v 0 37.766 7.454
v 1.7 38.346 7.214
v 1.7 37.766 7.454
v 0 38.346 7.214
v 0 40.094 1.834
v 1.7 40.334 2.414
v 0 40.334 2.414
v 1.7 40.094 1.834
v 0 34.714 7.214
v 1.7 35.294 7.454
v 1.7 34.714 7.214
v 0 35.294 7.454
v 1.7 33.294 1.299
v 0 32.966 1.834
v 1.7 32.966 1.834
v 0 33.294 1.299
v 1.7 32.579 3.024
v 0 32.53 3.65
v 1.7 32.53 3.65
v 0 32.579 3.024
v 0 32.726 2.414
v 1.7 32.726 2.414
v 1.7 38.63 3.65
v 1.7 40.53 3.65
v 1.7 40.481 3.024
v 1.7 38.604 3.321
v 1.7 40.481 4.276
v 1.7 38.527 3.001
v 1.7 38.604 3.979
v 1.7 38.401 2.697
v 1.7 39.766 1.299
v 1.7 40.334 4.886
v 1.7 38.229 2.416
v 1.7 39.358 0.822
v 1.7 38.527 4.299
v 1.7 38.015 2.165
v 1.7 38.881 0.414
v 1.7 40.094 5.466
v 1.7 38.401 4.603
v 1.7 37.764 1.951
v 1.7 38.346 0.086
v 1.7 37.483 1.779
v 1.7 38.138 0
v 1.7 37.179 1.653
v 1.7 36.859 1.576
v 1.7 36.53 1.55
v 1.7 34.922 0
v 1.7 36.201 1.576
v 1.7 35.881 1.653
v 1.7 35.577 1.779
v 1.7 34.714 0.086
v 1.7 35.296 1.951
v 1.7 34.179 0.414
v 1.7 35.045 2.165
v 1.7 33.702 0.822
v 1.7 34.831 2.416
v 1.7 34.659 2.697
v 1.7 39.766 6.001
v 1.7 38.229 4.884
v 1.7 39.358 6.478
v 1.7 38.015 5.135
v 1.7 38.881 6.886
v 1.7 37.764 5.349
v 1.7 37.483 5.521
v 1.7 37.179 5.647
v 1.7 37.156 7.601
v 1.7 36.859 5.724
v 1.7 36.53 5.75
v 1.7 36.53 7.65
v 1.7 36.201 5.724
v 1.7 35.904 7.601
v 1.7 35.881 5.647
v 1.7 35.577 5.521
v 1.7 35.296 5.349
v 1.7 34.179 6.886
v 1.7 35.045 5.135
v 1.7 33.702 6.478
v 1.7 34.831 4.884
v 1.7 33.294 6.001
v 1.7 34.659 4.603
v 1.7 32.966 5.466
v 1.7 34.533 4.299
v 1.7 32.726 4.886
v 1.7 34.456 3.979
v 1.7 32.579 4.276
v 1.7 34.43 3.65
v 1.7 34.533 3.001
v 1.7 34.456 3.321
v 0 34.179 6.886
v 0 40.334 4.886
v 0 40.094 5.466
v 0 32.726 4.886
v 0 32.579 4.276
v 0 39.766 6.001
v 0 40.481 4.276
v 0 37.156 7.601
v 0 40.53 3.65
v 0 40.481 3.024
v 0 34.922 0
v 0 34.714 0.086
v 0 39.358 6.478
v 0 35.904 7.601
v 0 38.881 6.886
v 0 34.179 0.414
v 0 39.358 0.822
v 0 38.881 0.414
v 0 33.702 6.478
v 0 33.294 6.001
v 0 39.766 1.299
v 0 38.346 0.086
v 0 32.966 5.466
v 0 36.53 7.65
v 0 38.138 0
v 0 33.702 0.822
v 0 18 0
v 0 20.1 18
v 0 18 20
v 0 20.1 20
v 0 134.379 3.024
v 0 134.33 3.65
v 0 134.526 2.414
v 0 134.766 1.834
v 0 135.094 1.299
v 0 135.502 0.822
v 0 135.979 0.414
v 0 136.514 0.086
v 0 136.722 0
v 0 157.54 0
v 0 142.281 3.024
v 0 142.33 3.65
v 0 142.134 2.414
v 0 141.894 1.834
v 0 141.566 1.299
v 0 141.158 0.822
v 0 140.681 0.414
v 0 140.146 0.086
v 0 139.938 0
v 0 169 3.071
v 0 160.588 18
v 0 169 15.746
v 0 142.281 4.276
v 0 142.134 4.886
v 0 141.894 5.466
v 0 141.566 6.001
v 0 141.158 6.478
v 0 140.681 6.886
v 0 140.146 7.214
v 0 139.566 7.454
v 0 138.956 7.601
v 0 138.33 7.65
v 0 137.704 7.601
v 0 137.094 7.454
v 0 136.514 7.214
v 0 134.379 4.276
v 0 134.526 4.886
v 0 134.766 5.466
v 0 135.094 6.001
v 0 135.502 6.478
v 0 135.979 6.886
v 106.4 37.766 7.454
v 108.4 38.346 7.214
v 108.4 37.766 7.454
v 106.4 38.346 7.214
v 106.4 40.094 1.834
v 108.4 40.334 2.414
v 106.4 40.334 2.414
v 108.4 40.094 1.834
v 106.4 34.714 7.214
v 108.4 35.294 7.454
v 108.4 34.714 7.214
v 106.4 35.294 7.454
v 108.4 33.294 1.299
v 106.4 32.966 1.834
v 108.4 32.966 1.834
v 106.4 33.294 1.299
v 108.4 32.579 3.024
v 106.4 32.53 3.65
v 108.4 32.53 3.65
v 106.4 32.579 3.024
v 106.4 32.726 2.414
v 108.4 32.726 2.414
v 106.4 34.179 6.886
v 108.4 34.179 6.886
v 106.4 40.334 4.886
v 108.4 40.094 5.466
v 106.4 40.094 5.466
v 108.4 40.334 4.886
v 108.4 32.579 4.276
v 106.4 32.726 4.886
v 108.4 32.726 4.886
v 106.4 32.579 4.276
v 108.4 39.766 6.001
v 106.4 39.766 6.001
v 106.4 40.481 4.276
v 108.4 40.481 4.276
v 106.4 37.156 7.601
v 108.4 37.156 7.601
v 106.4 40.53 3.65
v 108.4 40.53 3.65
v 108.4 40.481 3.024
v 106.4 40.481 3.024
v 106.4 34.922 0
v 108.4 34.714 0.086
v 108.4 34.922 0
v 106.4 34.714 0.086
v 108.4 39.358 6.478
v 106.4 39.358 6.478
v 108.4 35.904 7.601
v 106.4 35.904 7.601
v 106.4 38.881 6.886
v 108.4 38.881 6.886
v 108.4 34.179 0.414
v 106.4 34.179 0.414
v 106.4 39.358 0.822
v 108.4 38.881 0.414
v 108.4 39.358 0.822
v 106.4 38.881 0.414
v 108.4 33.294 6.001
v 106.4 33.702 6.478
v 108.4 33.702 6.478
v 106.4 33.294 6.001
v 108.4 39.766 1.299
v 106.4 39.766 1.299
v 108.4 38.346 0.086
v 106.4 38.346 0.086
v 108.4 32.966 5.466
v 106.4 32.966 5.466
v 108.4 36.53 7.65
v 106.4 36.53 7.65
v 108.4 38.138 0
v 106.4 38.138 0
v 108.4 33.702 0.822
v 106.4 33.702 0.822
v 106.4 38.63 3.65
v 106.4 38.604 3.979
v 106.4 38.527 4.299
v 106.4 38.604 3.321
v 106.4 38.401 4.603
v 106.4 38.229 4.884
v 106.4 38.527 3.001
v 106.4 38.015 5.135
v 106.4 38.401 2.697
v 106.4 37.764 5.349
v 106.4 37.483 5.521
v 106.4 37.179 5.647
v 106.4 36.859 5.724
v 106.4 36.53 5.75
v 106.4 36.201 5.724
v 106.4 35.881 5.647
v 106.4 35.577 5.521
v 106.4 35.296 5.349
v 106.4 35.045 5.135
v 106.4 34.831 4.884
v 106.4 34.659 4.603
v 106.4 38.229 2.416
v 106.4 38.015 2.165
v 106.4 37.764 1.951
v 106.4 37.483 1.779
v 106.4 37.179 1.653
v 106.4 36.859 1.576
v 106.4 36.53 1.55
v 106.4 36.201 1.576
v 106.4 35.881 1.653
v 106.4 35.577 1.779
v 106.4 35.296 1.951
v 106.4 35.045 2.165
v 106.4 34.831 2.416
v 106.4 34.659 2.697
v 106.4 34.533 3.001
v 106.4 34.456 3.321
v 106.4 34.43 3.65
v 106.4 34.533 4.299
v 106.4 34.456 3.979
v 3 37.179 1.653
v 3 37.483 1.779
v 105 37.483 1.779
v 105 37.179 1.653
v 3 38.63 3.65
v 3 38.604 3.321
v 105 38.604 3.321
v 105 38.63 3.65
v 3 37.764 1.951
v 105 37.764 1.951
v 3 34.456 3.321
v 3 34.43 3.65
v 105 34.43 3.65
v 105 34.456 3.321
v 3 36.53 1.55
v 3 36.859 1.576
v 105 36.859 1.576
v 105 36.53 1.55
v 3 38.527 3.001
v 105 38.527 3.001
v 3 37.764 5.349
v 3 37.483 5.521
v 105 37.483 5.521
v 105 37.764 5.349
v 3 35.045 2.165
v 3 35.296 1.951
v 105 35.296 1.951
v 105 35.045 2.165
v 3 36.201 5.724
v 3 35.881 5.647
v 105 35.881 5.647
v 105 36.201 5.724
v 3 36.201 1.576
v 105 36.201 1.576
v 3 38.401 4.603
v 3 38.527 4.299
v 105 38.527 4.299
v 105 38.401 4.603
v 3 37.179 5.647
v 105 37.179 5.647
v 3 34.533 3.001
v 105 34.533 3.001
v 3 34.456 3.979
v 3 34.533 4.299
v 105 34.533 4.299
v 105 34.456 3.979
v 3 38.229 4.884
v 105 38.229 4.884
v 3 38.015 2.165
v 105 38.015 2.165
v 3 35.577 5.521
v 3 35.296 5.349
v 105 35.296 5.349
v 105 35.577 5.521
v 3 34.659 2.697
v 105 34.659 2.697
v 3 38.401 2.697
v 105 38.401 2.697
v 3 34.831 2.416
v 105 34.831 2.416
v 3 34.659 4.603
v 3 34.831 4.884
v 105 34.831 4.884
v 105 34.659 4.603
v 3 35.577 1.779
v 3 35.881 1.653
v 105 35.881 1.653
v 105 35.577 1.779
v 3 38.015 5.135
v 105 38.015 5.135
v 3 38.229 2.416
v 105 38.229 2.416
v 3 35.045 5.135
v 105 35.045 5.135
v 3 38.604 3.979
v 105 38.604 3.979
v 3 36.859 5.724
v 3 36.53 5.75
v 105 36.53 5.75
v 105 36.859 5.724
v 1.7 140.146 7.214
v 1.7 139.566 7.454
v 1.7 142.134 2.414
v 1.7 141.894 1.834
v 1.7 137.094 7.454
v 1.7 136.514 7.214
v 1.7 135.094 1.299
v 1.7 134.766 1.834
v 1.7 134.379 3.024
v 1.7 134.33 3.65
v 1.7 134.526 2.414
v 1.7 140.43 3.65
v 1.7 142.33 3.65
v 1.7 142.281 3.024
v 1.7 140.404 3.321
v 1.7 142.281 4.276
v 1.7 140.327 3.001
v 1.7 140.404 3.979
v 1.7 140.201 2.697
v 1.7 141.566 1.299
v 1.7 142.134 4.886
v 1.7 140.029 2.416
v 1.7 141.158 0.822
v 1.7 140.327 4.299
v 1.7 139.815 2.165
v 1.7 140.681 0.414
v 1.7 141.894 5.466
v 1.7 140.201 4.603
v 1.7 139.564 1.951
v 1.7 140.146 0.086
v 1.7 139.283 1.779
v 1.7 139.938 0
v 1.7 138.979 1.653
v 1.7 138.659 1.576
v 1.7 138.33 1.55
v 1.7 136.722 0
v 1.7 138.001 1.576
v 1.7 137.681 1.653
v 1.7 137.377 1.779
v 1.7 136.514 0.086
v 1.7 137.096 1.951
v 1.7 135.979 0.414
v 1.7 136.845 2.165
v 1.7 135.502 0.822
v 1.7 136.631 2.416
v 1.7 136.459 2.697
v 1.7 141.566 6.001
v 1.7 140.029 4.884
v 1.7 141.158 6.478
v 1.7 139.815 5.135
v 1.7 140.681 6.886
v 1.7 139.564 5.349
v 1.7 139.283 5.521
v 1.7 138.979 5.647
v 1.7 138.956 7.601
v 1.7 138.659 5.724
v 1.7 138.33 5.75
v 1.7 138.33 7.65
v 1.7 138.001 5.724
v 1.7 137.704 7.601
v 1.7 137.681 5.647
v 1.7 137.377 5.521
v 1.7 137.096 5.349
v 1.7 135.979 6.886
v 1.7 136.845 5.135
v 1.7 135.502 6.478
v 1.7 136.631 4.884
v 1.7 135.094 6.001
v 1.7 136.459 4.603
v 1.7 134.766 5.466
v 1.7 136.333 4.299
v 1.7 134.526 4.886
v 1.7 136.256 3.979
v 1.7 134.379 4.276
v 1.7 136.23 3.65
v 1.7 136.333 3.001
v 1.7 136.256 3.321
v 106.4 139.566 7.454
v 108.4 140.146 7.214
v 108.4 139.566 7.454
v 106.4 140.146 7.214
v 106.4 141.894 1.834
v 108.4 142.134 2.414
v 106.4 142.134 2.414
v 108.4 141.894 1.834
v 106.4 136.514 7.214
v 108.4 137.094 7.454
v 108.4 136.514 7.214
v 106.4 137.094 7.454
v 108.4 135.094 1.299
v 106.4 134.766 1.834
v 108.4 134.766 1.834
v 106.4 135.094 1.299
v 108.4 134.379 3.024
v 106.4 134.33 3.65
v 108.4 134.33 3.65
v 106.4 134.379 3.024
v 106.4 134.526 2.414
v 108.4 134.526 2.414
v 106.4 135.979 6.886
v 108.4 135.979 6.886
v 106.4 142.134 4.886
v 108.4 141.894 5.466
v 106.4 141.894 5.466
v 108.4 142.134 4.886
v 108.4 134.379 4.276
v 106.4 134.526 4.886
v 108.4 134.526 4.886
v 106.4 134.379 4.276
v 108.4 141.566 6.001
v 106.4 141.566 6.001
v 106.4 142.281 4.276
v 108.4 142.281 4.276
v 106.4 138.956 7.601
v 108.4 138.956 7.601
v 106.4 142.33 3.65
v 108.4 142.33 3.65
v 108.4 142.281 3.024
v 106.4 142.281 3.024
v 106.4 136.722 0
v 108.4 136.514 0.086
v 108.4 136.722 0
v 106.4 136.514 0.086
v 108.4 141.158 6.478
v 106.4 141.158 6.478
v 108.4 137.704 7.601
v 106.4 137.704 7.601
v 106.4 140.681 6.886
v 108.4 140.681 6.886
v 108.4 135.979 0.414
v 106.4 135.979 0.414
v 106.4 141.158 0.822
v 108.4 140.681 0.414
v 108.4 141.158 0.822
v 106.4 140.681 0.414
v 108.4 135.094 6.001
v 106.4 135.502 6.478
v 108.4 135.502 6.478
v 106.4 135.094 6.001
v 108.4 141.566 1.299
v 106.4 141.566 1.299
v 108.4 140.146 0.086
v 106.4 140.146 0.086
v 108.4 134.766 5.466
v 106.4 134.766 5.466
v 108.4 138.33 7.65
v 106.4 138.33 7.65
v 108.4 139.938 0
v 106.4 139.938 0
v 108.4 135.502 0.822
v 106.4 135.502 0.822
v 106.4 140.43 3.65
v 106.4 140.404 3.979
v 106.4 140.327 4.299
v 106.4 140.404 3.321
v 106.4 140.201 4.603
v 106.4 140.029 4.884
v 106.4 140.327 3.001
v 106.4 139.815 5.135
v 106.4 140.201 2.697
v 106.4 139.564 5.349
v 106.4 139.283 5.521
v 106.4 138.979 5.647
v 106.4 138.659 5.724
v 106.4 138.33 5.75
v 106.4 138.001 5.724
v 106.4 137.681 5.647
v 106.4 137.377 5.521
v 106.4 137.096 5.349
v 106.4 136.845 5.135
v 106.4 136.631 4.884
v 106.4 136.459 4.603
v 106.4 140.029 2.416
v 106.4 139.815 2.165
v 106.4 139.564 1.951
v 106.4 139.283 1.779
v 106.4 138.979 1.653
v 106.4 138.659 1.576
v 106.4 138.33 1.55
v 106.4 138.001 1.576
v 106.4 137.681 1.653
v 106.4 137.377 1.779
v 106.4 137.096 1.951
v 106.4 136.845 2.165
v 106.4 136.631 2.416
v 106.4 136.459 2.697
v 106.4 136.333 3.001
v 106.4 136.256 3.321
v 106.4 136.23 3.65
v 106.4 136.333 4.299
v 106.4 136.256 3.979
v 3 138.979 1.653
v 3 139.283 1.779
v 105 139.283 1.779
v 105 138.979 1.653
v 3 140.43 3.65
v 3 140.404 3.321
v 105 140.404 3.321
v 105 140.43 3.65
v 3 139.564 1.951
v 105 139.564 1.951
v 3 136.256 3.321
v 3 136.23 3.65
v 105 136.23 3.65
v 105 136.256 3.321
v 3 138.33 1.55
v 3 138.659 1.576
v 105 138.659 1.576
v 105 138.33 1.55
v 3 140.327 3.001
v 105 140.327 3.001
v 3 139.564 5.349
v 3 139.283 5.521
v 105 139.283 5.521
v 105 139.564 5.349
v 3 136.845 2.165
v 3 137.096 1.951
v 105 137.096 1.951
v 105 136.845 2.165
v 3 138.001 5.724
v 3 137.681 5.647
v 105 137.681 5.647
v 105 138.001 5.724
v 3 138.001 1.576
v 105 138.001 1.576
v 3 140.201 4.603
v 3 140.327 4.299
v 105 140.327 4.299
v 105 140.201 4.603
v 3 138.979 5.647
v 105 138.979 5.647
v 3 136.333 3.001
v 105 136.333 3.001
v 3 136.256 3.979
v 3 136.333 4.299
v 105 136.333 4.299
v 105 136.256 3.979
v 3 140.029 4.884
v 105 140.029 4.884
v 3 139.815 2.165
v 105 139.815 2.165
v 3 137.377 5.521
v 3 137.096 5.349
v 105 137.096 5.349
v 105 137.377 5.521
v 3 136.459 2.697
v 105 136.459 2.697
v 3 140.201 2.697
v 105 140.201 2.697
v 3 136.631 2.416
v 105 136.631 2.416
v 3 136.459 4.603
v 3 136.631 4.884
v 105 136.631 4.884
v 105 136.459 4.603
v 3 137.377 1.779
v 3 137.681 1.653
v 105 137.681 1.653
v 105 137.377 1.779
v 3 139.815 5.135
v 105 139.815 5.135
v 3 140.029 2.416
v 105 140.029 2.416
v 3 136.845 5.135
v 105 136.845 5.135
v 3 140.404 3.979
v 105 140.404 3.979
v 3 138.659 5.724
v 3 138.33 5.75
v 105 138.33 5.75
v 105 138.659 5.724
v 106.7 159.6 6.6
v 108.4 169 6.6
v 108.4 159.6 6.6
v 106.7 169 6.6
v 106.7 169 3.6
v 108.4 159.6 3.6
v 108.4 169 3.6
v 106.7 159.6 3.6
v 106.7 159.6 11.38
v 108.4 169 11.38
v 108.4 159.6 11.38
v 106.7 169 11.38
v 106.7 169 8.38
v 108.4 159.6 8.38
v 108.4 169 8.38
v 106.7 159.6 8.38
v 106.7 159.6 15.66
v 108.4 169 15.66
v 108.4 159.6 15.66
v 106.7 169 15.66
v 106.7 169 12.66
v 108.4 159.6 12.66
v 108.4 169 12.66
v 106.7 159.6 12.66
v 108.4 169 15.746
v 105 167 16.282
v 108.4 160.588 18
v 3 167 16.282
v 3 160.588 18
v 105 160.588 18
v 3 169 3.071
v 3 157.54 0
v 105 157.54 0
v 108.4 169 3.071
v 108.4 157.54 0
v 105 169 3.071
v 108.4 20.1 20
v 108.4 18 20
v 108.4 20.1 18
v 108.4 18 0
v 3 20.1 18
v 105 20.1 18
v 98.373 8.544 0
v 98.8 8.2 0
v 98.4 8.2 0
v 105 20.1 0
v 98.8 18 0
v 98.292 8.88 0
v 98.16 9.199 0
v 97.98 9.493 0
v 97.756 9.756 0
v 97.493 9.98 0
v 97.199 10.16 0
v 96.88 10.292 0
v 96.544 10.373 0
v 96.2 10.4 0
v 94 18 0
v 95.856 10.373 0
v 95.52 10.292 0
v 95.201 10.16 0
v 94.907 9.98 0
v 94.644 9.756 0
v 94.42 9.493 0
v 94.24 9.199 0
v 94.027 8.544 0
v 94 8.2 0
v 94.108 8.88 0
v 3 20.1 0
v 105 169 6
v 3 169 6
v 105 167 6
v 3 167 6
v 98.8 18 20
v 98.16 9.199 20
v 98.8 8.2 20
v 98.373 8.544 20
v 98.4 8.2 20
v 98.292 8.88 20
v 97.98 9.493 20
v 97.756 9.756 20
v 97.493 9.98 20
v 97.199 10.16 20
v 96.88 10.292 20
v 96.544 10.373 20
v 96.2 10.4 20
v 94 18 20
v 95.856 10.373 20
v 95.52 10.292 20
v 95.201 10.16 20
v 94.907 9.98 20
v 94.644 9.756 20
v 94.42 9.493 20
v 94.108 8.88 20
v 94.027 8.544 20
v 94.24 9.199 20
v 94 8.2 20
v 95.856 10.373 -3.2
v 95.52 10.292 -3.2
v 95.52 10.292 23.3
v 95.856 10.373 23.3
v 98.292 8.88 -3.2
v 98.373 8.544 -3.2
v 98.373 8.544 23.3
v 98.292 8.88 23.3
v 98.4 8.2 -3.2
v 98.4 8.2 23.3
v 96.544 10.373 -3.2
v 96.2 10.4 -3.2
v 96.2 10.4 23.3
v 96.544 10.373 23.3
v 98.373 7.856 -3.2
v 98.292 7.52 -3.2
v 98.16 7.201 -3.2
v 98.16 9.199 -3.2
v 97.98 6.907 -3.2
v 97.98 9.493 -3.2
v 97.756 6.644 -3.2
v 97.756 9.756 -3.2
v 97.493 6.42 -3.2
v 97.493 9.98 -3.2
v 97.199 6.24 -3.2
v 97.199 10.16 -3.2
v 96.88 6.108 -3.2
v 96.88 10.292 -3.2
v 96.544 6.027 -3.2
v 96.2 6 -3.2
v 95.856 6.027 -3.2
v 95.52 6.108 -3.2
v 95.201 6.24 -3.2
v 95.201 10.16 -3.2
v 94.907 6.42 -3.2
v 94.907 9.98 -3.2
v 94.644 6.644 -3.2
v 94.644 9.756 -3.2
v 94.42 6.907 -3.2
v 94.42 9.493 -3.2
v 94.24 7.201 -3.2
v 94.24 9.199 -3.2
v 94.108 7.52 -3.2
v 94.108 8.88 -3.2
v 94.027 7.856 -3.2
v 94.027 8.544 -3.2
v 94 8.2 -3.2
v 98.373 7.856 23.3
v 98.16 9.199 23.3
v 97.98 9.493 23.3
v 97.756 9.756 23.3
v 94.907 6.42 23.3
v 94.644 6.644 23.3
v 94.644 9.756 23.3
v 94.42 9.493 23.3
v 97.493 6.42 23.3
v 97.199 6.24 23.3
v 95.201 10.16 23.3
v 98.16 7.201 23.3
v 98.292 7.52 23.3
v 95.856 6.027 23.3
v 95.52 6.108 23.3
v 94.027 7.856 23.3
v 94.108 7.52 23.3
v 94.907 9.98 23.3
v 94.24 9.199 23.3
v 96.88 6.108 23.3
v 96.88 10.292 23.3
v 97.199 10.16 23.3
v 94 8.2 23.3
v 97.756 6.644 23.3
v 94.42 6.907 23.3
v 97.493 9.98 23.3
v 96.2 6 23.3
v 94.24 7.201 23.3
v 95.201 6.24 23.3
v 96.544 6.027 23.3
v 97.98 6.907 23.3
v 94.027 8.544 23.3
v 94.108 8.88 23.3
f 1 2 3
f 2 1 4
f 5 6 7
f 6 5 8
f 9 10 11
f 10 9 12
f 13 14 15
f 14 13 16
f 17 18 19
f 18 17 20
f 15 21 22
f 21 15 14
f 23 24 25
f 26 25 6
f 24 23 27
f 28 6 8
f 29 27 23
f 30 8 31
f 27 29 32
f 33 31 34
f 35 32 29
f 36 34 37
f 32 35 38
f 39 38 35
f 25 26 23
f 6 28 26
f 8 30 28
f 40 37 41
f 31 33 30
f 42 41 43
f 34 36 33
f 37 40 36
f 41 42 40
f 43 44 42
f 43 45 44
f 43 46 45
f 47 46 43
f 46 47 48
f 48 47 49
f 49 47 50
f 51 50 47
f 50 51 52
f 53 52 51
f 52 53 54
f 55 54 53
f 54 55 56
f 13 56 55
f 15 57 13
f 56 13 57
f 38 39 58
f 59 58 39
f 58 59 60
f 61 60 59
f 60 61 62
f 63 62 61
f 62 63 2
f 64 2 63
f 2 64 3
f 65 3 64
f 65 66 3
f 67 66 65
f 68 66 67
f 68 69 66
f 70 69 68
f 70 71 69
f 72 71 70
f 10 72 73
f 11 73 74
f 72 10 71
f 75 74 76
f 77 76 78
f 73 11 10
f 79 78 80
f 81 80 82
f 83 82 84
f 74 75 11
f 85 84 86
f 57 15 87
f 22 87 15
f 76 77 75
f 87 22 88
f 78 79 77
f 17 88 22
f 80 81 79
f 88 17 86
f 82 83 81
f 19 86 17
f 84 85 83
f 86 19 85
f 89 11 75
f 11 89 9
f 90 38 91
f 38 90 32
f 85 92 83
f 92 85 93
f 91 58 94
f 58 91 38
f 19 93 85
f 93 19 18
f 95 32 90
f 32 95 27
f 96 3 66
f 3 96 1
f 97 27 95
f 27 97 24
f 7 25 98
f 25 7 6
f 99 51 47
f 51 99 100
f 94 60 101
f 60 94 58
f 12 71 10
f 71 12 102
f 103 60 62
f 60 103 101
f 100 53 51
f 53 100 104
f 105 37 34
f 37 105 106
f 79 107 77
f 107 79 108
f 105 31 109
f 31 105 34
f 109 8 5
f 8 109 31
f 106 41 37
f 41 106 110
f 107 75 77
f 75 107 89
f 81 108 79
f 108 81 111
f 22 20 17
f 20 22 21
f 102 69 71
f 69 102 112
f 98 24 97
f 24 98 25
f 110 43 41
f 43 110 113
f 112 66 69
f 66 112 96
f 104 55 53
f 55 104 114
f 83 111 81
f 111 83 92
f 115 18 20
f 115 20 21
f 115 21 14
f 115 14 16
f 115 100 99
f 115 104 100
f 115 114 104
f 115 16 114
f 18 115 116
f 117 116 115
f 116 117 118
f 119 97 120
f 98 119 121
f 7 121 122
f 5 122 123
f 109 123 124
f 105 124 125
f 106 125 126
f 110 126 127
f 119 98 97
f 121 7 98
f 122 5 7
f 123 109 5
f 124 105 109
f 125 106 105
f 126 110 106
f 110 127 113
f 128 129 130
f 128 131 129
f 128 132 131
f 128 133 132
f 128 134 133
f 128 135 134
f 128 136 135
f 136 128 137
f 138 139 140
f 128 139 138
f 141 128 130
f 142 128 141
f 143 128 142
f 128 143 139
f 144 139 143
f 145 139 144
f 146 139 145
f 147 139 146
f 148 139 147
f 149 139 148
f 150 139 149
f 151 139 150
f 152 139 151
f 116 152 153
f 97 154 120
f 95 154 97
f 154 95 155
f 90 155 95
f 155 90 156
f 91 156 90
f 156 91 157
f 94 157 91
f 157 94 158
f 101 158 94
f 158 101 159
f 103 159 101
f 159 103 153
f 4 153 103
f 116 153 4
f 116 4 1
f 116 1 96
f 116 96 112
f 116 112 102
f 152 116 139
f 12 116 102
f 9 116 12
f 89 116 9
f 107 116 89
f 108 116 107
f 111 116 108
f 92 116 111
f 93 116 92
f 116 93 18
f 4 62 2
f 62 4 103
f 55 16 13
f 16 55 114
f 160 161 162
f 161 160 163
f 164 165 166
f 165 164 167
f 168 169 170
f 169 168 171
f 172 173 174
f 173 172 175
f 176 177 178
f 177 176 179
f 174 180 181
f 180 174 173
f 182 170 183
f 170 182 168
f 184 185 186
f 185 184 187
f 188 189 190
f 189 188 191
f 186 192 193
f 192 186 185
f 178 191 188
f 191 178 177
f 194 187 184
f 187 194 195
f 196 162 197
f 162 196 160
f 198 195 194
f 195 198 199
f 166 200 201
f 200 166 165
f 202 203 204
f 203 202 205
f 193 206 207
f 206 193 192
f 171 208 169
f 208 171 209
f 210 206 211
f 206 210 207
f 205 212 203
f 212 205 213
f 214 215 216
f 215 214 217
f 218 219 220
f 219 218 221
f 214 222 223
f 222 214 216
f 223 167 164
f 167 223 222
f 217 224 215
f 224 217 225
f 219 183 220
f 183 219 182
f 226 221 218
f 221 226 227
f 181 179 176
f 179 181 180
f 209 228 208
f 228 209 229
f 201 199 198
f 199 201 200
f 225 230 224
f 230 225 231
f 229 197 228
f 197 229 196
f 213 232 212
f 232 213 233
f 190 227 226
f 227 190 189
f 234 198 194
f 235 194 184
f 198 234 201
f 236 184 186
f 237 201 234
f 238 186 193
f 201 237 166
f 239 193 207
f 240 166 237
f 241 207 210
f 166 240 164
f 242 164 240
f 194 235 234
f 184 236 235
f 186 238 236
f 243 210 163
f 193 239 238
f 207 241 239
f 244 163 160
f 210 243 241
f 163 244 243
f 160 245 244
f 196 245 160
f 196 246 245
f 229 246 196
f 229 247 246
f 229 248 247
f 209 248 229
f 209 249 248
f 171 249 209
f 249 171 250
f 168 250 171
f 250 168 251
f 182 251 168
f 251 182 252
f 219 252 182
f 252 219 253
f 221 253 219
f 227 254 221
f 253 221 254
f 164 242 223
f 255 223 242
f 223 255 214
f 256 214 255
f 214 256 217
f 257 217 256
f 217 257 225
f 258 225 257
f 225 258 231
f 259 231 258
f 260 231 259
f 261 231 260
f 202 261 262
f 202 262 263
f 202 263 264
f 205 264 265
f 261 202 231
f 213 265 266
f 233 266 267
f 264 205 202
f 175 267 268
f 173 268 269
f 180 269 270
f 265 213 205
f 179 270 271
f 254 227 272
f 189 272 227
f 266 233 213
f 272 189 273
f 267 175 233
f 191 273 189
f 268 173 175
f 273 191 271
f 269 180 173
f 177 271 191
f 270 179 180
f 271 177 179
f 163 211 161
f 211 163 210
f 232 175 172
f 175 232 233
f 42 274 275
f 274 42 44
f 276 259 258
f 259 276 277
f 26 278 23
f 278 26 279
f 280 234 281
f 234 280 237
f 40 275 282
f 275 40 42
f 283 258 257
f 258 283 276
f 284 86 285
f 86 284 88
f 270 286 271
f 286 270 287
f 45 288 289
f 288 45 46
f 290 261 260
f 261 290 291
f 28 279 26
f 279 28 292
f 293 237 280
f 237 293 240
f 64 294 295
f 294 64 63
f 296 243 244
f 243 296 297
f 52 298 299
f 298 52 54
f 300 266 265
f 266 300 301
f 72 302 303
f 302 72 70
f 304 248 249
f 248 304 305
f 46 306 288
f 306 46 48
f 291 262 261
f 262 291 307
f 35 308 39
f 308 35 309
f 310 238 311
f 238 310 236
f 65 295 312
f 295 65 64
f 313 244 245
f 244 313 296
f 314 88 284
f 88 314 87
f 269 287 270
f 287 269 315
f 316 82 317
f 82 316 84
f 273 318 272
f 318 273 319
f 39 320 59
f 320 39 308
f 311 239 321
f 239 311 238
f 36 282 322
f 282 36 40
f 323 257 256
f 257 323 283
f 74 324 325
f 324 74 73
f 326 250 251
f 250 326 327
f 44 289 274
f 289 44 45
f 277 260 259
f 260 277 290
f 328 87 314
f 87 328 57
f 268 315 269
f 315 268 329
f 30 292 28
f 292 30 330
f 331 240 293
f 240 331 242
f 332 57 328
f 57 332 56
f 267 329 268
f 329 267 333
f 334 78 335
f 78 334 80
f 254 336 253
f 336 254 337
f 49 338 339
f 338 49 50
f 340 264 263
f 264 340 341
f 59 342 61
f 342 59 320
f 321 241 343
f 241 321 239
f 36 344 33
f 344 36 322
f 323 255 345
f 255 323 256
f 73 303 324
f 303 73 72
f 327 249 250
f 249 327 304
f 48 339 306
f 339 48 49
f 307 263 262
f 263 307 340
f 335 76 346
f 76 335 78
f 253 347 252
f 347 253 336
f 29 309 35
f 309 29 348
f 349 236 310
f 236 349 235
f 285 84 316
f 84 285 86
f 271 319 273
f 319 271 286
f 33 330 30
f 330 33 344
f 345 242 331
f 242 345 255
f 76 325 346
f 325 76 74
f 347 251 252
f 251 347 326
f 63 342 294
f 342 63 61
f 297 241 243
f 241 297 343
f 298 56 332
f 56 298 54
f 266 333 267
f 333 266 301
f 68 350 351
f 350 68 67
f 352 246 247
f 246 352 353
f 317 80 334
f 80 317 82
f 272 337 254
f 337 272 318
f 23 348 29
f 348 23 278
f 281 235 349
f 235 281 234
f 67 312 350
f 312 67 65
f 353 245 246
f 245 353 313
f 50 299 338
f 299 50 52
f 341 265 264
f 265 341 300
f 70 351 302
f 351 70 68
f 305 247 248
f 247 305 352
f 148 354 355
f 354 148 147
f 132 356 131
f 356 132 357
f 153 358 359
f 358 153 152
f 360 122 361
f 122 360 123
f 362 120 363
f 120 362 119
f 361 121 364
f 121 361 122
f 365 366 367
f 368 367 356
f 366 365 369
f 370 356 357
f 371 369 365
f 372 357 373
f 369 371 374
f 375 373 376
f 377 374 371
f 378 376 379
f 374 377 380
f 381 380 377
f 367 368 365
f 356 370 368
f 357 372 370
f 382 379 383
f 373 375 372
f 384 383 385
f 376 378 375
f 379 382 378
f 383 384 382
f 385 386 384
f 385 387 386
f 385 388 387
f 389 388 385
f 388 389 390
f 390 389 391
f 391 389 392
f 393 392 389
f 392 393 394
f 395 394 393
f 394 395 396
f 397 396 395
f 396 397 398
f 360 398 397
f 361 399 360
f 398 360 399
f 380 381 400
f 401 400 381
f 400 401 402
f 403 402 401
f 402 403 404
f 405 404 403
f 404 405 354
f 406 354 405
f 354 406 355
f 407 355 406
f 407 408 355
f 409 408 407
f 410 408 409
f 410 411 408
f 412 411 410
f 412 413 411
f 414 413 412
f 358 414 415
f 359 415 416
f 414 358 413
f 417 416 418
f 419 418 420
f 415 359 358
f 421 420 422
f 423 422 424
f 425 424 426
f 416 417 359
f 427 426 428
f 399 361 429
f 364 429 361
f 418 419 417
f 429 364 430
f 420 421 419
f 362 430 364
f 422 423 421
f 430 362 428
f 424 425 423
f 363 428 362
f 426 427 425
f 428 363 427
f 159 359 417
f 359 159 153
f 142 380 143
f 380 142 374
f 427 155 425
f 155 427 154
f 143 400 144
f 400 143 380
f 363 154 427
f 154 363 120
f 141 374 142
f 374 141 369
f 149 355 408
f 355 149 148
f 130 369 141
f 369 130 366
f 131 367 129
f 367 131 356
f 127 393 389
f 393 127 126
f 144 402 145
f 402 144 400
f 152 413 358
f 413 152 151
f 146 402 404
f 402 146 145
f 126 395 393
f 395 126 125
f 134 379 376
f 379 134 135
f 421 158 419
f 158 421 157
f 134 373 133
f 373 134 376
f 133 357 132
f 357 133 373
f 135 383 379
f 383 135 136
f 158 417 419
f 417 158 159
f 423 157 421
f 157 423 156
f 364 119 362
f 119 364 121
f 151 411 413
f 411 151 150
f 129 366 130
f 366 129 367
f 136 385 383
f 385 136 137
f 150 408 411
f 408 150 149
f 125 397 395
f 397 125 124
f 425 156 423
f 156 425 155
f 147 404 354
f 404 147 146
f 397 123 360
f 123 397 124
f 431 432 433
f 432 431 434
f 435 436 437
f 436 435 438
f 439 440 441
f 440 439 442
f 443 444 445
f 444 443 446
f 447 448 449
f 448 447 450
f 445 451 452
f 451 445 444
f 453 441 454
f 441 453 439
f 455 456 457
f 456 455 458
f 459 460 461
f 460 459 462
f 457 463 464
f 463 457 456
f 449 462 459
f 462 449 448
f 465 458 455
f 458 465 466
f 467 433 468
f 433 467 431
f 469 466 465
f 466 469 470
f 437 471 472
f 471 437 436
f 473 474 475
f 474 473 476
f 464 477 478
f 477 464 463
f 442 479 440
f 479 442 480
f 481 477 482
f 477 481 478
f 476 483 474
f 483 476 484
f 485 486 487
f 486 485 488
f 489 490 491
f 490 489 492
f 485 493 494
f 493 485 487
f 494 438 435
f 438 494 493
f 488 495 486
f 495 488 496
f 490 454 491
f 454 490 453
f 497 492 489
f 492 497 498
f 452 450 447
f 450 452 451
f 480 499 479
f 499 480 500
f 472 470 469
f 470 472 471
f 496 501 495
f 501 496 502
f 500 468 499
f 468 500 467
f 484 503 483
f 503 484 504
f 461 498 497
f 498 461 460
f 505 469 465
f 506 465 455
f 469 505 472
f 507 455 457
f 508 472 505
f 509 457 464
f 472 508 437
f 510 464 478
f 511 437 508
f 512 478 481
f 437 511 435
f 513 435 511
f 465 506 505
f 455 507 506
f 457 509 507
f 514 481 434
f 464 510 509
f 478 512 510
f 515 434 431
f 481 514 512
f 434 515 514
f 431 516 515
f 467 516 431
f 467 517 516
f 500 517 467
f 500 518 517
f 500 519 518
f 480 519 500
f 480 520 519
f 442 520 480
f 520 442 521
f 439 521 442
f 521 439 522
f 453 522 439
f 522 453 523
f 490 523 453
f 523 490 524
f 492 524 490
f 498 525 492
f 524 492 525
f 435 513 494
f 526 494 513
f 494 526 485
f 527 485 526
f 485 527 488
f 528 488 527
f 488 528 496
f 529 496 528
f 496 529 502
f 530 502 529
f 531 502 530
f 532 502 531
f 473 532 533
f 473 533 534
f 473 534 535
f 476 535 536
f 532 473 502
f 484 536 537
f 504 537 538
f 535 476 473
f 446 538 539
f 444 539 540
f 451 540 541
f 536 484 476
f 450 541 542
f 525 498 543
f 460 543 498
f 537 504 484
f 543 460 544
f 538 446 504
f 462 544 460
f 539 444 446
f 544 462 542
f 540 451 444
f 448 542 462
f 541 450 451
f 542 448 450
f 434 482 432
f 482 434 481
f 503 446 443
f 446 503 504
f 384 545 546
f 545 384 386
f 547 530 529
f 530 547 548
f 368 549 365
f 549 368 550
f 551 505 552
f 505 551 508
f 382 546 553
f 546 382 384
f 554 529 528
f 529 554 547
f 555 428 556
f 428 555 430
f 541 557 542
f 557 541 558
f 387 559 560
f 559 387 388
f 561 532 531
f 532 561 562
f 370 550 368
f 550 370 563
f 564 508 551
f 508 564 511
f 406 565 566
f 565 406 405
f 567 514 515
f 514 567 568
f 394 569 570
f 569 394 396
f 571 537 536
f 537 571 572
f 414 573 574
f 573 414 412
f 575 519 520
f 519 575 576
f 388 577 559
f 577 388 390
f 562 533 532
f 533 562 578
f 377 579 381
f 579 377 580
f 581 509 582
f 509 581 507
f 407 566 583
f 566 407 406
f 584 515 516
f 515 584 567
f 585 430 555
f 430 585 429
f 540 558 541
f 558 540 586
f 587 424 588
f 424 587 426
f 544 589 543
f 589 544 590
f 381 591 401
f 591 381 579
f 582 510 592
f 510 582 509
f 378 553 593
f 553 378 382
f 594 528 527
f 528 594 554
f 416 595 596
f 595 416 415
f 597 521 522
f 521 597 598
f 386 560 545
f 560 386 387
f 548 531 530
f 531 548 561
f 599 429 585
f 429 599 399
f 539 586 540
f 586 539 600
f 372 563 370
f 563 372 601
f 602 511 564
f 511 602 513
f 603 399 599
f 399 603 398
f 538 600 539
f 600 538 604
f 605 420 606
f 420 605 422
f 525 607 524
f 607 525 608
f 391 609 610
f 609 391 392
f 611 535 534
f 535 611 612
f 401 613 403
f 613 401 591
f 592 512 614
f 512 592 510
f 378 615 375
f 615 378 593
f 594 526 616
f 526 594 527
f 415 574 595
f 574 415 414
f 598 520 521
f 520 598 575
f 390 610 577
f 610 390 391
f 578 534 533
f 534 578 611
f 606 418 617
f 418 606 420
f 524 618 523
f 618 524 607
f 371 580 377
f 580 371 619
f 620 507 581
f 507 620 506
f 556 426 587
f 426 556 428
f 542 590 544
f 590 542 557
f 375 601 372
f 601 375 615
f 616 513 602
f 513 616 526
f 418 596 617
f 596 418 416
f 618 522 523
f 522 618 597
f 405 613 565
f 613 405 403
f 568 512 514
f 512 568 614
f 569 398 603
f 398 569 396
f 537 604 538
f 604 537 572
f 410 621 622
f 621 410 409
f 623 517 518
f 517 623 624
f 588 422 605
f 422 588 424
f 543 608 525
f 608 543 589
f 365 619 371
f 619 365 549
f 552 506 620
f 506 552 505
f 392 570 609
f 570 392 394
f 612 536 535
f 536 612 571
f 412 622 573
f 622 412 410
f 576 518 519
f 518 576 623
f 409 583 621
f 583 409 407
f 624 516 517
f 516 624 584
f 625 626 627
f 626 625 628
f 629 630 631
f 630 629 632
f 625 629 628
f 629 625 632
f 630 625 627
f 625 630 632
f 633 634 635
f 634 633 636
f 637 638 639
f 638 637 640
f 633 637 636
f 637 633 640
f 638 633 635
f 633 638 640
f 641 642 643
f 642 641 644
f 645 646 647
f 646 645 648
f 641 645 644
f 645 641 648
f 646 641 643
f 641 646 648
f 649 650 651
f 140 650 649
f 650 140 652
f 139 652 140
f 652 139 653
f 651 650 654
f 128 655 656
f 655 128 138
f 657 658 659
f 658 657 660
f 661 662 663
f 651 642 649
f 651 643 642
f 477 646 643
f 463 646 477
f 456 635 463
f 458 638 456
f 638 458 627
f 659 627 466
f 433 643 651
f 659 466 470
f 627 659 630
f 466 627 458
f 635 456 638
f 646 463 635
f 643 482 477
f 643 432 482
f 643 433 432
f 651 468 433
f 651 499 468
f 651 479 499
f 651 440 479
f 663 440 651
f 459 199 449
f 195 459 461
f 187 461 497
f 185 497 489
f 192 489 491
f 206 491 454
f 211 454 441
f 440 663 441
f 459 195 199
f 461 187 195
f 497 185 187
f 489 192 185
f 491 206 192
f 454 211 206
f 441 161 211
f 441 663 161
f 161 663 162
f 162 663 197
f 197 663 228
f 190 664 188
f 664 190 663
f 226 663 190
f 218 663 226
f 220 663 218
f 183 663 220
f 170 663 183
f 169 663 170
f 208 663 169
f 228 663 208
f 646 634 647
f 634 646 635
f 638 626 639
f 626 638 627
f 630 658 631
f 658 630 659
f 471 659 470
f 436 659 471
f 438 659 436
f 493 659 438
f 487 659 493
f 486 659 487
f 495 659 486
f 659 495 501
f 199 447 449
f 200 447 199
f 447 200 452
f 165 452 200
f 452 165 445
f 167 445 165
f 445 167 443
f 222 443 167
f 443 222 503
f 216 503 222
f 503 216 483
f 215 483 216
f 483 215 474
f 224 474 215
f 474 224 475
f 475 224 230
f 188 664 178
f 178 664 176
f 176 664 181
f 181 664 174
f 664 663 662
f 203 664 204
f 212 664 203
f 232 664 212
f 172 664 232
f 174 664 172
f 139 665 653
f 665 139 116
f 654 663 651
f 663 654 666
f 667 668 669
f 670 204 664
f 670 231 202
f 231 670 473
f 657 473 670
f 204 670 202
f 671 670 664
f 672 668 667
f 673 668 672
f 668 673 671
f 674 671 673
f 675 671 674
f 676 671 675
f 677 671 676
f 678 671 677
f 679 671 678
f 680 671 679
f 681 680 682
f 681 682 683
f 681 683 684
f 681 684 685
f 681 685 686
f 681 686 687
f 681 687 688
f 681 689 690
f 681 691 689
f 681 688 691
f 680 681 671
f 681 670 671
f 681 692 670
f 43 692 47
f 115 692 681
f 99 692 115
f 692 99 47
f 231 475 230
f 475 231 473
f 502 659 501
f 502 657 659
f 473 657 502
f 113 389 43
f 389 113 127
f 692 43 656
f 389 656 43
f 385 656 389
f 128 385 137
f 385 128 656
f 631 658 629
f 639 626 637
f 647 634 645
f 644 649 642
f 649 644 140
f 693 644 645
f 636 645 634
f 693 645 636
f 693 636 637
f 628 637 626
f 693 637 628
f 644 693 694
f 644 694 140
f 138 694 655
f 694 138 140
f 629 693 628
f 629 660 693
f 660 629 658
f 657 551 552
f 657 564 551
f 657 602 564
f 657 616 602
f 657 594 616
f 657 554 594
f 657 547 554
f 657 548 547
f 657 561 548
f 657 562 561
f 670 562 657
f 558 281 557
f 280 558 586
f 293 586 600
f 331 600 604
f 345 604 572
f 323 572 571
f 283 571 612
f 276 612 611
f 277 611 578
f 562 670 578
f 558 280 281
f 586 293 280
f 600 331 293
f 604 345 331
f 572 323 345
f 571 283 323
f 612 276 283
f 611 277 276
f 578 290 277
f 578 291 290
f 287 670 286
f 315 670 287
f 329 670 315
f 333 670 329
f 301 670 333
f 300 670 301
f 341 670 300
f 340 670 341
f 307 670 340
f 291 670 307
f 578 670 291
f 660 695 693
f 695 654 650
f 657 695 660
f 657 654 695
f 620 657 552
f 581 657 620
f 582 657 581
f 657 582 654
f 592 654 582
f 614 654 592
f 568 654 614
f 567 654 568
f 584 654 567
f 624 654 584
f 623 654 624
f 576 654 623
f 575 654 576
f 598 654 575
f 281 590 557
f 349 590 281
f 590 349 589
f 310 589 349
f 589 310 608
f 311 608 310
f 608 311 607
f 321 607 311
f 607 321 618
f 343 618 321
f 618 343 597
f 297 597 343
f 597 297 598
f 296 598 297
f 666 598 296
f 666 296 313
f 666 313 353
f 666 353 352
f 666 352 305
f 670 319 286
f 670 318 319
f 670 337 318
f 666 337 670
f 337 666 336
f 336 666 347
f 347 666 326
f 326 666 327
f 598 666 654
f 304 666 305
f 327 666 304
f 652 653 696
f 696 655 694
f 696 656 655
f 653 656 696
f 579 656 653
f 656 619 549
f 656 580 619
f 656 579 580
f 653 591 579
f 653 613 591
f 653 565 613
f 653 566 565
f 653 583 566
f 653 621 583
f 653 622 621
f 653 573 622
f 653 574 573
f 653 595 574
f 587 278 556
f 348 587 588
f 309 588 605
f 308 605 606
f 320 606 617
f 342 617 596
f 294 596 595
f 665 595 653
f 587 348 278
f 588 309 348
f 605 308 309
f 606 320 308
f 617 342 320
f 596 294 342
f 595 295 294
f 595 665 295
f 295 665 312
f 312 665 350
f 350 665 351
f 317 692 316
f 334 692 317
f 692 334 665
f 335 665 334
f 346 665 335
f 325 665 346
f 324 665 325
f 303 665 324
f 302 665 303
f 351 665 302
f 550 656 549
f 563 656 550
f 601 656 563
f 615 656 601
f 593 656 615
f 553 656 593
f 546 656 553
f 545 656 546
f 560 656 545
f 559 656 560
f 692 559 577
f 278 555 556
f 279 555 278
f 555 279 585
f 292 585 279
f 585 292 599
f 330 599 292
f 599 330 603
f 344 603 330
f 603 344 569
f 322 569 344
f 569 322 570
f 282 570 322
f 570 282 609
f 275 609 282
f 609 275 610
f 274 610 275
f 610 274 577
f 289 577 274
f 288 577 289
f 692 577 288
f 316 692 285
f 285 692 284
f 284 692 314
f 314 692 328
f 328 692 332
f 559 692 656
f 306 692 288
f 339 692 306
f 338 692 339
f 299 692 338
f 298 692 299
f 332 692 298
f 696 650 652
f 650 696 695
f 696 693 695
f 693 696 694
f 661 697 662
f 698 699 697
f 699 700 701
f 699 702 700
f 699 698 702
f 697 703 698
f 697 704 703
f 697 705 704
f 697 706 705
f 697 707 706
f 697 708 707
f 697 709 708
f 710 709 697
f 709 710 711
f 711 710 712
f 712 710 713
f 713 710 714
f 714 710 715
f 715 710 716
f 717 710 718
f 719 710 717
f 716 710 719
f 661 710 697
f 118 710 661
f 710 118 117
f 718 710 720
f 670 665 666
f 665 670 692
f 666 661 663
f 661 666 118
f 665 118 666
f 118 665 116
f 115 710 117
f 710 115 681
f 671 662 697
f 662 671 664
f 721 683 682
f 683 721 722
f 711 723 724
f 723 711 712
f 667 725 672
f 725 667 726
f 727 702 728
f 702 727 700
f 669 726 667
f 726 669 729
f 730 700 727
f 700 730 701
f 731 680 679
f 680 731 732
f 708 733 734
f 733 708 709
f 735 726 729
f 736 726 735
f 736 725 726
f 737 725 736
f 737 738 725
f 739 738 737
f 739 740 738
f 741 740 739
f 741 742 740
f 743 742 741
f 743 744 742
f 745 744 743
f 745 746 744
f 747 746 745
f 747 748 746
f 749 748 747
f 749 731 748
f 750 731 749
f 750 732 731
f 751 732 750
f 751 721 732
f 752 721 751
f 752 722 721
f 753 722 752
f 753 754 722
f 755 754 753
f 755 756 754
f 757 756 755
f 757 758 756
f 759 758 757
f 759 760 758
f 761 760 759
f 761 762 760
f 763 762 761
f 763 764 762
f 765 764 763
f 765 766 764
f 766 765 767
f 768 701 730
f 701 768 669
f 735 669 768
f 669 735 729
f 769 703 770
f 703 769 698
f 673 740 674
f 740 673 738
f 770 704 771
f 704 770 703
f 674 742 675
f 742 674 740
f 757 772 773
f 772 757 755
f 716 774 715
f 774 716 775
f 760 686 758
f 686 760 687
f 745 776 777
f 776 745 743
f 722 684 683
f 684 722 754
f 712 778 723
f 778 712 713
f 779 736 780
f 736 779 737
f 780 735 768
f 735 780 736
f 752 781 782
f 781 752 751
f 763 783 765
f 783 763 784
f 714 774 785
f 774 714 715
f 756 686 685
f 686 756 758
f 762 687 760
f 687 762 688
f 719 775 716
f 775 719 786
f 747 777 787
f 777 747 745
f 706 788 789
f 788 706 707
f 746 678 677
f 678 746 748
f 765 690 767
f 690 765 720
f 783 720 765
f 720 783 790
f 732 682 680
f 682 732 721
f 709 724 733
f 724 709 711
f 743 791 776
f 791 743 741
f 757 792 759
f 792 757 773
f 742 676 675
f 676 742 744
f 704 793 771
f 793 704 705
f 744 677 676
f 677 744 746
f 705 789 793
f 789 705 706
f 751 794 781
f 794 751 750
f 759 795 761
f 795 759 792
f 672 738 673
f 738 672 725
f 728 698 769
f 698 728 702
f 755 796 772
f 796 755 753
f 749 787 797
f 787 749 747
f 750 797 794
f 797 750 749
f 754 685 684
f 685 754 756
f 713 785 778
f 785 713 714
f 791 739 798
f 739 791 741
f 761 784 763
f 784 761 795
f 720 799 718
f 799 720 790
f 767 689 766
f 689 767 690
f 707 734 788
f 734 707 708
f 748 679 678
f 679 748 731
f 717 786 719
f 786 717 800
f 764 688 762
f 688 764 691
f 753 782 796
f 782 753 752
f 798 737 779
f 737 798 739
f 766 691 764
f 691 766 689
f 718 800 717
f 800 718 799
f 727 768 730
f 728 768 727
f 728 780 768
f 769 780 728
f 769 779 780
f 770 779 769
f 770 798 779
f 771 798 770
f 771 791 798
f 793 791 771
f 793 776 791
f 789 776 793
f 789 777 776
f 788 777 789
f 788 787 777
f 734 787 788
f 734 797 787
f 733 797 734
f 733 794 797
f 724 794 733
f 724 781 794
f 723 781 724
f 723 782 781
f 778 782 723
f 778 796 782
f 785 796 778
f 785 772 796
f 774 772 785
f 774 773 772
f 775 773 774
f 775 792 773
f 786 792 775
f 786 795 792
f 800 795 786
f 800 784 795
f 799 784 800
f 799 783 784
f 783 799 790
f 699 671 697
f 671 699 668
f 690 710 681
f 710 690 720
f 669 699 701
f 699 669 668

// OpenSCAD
// file: frame.scad
module srubki(width)
{
    translate([-1,0,5.8-2.15])
        rotate([0,90,0])
            cylinder(r=2.1,h=width+4);

    translate([0,0,5.8-2.15])
    {
        rotate([0,90,0])
            cylinder(r=4,h=1.7);

        translate([width-2,0,0])
            rotate([0,90,0])
                cylinder(r=4,h=2.5);
    }

}

module srubki2(width)
{
    translate([0,37.38+2.15,0])
    {
        srubki(width);

        translate([0,101.8,0])
        {
            srubki(width);
        }
    }
}

module zabki(width)
{
    translate([width-1.7,172-9.4,3.6])
    {
        len=10;
        
        cube([2.2,len,3]);
        
        translate([0,0,2.42+2.36])
            cube([2.2,len,3]);
        
        translate([0,0,2.42+2.36*2+1.92])
            cube([2.2,len,3]);
    }
}

module skosy(width)
{
    translate([0,130,27])
        rotate([-15,0,0])
            cube([width+2,50,10]);

    translate([0,132,-18])
        rotate([15,0,0])
            cube([width+2,50,10]);

}

module podpora()
{
    cylinder(r1=3,r2=0.5,h=6);
}

module frame_support()
{
    translate([0,171,0])
    {
        for(n=[10:10:100])
        {
            translate([n,0,0])
                podpora();
        }
    }
    
    translate([5,168,0])
    cube([100,6,1]);
}

module frame(width)
{
    translate([0,-3,0])
    difference()
    {
        translate([0,23,0])
            cube([width,149,18]);

        translate([3,0,-1])
            cube([width-6.4,170,20]);

        translate([3,10,-4])
            cube([width-6.4,170,10]);

        cube([width+.2,2.1,20]);

        srubki2(width);

        zabki(width);

        skosy(width);
    }
    
//    frame_support();
}

frame(108.4);

//srubki2();
//zabki();
//skosy();
//frame();
// file: front.scad
$fn=40;

module front(width)
{
    translate([0,18,0])
        cube([width,2.1,20]);
    
//    color("blue")
    translate([width-12.2,8.2,-3.2])
        cylinder(r=2.2,h=26.5);
    
    translate([width-14.4,8.2,0])
        cube([4.8,10,20]);
}

//translate([108,0,23.2])
//    rotate([0,90,90])
//        latch();
//latch_internal_support();

front(108.4);
// file: latch.scad
$fn=40;

module b1()
{
    difference()
    {
        union()
        {
            difference()
            {
                cube([3,16.74,16.45]);
                
                translate([0,11.74,11.45])
                    cube([3,20,16.45]);
                
                translate([0,-8,20])
                    rotate([-45,0,0])
                        cube([3,10,10]);
            }
            
            translate([0,11.74,11.45])
                rotate([0,90,0])
                    cylinder(r=5,h=3);
            
            
            color("yellow")
                translate([0,-9,5.5])
                    difference()
                    {
                        cube([3,9,7.36]);
                        
                        translate([0,-6,-2])
                        rotate([-45,0,0])
                        cube([3,9,7.36]);


                        translate([0,0,6])
                        rotate([15,0,0])
                        cube([3,9,7.36]);
                    }
        }
        
    }
    
}   

module l1()
{
    translate([(26.5-12)/2,11.2,0])
    {
        color("green")
        difference()
        {
            union()
            {
                difference()
                {
                    cube([12,67,9]);
                    translate([0,0,9])
                        rotate([-5,0,0])
                            cube([12,67,9]);
                }
                
                
                translate([0,60.5,0])
                    rotate([10,0,0])
                        cube([12,7,14]);
            }
            
            
            translate([0,67.5,-3])
                rotate([10,0,0])
                    cube([12,4,25]);
            
            translate([0,64,0])
                cube([12,3.5,2.2]);
        }


    }
}

module latch(width)
{
    
    echo("AAAAAAAAA");
    
    echo(width);
    
translate([width-0.4,0,23.2])
    rotate([0,90,90])
    difference()
    {
        union()
        {
            color("red")
                cube([26.5,21.2,3.6]);

            l1();
            
            translate([0,4.46,0])
            {
                b1();
                translate([26.5-3,0,0])
                    b1();
            }
        }
        translate([0,11.74,8.3])
            rotate([0,90,0])
                cylinder(r=2.55,h=26.5);
    }

translate([25,0,4])
    union()
    {
        cube([3,20,12]);
        cube([6,2,12]);
    }

}

module latch_internal_support()
{
    translate([0,0,-2.2])
    {
        translate([0,5,0])
        {
            translate([102,0,0])
                cylinder(r=0.5,h=24);

            translate([99,0,0])
                cylinder(r=0.5,h=24);
        }
        translate([0,8,0])
        {
            translate([100,0,0])
                cylinder(r=0.5,h=24);

            translate([105,0,0])
                cylinder(r=0.5,h=24);

            translate([110,0,0])
                cylinder(r=0.5,h=24);
        }
        translate([0,12,0])
        {
            translate([89,0,0])
                cylinder(r=0.5,h=24);

            translate([96,0,0])
                cylinder(r=0.5,h=24);

            translate([100,0,0])
                cylinder(r=0.5,h=24);

            translate([105,0,0])
                cylinder(r=0.5,h=24);

            translate([110,0,0])
                cylinder(r=0.5,h=24);
        }
        translate([0,15,0])
        {
            translate([90,0,0])
                cylinder(r=0.5,h=24);

            translate([96,0,0])
                cylinder(r=0.5,h=24);

            translate([101,0,0])
                cylinder(r=0.5,h=24);

        }
    }
    translate([99,4,4])
    {
        difference()
        {
            cube([11.5,12,1]);
            
            translate([5,0,0])
                cube([8,3,1]);

            translate([3,9,0])
                cube([18,3,1]);
        }
    }

    translate([99,4,9])
    {
        difference()
        {
            cube([11.5,12,1]);
            
            translate([5,0,0])
                cube([8,3,1]);

            translate([3,9,0])
                cube([18,3,1]);
        }
    }

    translate([99,4,15])
    {
        difference()
        {
            cube([11.5,12,1]);
            
            translate([5,0,0])
                cube([8,3,1]);

            translate([3,9,0])
                cube([18,3,1]);
        }
    }

    translate([89.5,12,1])
        rotate([0,0,70])
            cube([3,1,18]);

    
}
// main file
$fn=40;

//width = 108.4;

width = 108.4;

use <latch.scad>;
use <front.scad>;
use <frame.scad>;

frame(width);
front(width);

//latch(width);
